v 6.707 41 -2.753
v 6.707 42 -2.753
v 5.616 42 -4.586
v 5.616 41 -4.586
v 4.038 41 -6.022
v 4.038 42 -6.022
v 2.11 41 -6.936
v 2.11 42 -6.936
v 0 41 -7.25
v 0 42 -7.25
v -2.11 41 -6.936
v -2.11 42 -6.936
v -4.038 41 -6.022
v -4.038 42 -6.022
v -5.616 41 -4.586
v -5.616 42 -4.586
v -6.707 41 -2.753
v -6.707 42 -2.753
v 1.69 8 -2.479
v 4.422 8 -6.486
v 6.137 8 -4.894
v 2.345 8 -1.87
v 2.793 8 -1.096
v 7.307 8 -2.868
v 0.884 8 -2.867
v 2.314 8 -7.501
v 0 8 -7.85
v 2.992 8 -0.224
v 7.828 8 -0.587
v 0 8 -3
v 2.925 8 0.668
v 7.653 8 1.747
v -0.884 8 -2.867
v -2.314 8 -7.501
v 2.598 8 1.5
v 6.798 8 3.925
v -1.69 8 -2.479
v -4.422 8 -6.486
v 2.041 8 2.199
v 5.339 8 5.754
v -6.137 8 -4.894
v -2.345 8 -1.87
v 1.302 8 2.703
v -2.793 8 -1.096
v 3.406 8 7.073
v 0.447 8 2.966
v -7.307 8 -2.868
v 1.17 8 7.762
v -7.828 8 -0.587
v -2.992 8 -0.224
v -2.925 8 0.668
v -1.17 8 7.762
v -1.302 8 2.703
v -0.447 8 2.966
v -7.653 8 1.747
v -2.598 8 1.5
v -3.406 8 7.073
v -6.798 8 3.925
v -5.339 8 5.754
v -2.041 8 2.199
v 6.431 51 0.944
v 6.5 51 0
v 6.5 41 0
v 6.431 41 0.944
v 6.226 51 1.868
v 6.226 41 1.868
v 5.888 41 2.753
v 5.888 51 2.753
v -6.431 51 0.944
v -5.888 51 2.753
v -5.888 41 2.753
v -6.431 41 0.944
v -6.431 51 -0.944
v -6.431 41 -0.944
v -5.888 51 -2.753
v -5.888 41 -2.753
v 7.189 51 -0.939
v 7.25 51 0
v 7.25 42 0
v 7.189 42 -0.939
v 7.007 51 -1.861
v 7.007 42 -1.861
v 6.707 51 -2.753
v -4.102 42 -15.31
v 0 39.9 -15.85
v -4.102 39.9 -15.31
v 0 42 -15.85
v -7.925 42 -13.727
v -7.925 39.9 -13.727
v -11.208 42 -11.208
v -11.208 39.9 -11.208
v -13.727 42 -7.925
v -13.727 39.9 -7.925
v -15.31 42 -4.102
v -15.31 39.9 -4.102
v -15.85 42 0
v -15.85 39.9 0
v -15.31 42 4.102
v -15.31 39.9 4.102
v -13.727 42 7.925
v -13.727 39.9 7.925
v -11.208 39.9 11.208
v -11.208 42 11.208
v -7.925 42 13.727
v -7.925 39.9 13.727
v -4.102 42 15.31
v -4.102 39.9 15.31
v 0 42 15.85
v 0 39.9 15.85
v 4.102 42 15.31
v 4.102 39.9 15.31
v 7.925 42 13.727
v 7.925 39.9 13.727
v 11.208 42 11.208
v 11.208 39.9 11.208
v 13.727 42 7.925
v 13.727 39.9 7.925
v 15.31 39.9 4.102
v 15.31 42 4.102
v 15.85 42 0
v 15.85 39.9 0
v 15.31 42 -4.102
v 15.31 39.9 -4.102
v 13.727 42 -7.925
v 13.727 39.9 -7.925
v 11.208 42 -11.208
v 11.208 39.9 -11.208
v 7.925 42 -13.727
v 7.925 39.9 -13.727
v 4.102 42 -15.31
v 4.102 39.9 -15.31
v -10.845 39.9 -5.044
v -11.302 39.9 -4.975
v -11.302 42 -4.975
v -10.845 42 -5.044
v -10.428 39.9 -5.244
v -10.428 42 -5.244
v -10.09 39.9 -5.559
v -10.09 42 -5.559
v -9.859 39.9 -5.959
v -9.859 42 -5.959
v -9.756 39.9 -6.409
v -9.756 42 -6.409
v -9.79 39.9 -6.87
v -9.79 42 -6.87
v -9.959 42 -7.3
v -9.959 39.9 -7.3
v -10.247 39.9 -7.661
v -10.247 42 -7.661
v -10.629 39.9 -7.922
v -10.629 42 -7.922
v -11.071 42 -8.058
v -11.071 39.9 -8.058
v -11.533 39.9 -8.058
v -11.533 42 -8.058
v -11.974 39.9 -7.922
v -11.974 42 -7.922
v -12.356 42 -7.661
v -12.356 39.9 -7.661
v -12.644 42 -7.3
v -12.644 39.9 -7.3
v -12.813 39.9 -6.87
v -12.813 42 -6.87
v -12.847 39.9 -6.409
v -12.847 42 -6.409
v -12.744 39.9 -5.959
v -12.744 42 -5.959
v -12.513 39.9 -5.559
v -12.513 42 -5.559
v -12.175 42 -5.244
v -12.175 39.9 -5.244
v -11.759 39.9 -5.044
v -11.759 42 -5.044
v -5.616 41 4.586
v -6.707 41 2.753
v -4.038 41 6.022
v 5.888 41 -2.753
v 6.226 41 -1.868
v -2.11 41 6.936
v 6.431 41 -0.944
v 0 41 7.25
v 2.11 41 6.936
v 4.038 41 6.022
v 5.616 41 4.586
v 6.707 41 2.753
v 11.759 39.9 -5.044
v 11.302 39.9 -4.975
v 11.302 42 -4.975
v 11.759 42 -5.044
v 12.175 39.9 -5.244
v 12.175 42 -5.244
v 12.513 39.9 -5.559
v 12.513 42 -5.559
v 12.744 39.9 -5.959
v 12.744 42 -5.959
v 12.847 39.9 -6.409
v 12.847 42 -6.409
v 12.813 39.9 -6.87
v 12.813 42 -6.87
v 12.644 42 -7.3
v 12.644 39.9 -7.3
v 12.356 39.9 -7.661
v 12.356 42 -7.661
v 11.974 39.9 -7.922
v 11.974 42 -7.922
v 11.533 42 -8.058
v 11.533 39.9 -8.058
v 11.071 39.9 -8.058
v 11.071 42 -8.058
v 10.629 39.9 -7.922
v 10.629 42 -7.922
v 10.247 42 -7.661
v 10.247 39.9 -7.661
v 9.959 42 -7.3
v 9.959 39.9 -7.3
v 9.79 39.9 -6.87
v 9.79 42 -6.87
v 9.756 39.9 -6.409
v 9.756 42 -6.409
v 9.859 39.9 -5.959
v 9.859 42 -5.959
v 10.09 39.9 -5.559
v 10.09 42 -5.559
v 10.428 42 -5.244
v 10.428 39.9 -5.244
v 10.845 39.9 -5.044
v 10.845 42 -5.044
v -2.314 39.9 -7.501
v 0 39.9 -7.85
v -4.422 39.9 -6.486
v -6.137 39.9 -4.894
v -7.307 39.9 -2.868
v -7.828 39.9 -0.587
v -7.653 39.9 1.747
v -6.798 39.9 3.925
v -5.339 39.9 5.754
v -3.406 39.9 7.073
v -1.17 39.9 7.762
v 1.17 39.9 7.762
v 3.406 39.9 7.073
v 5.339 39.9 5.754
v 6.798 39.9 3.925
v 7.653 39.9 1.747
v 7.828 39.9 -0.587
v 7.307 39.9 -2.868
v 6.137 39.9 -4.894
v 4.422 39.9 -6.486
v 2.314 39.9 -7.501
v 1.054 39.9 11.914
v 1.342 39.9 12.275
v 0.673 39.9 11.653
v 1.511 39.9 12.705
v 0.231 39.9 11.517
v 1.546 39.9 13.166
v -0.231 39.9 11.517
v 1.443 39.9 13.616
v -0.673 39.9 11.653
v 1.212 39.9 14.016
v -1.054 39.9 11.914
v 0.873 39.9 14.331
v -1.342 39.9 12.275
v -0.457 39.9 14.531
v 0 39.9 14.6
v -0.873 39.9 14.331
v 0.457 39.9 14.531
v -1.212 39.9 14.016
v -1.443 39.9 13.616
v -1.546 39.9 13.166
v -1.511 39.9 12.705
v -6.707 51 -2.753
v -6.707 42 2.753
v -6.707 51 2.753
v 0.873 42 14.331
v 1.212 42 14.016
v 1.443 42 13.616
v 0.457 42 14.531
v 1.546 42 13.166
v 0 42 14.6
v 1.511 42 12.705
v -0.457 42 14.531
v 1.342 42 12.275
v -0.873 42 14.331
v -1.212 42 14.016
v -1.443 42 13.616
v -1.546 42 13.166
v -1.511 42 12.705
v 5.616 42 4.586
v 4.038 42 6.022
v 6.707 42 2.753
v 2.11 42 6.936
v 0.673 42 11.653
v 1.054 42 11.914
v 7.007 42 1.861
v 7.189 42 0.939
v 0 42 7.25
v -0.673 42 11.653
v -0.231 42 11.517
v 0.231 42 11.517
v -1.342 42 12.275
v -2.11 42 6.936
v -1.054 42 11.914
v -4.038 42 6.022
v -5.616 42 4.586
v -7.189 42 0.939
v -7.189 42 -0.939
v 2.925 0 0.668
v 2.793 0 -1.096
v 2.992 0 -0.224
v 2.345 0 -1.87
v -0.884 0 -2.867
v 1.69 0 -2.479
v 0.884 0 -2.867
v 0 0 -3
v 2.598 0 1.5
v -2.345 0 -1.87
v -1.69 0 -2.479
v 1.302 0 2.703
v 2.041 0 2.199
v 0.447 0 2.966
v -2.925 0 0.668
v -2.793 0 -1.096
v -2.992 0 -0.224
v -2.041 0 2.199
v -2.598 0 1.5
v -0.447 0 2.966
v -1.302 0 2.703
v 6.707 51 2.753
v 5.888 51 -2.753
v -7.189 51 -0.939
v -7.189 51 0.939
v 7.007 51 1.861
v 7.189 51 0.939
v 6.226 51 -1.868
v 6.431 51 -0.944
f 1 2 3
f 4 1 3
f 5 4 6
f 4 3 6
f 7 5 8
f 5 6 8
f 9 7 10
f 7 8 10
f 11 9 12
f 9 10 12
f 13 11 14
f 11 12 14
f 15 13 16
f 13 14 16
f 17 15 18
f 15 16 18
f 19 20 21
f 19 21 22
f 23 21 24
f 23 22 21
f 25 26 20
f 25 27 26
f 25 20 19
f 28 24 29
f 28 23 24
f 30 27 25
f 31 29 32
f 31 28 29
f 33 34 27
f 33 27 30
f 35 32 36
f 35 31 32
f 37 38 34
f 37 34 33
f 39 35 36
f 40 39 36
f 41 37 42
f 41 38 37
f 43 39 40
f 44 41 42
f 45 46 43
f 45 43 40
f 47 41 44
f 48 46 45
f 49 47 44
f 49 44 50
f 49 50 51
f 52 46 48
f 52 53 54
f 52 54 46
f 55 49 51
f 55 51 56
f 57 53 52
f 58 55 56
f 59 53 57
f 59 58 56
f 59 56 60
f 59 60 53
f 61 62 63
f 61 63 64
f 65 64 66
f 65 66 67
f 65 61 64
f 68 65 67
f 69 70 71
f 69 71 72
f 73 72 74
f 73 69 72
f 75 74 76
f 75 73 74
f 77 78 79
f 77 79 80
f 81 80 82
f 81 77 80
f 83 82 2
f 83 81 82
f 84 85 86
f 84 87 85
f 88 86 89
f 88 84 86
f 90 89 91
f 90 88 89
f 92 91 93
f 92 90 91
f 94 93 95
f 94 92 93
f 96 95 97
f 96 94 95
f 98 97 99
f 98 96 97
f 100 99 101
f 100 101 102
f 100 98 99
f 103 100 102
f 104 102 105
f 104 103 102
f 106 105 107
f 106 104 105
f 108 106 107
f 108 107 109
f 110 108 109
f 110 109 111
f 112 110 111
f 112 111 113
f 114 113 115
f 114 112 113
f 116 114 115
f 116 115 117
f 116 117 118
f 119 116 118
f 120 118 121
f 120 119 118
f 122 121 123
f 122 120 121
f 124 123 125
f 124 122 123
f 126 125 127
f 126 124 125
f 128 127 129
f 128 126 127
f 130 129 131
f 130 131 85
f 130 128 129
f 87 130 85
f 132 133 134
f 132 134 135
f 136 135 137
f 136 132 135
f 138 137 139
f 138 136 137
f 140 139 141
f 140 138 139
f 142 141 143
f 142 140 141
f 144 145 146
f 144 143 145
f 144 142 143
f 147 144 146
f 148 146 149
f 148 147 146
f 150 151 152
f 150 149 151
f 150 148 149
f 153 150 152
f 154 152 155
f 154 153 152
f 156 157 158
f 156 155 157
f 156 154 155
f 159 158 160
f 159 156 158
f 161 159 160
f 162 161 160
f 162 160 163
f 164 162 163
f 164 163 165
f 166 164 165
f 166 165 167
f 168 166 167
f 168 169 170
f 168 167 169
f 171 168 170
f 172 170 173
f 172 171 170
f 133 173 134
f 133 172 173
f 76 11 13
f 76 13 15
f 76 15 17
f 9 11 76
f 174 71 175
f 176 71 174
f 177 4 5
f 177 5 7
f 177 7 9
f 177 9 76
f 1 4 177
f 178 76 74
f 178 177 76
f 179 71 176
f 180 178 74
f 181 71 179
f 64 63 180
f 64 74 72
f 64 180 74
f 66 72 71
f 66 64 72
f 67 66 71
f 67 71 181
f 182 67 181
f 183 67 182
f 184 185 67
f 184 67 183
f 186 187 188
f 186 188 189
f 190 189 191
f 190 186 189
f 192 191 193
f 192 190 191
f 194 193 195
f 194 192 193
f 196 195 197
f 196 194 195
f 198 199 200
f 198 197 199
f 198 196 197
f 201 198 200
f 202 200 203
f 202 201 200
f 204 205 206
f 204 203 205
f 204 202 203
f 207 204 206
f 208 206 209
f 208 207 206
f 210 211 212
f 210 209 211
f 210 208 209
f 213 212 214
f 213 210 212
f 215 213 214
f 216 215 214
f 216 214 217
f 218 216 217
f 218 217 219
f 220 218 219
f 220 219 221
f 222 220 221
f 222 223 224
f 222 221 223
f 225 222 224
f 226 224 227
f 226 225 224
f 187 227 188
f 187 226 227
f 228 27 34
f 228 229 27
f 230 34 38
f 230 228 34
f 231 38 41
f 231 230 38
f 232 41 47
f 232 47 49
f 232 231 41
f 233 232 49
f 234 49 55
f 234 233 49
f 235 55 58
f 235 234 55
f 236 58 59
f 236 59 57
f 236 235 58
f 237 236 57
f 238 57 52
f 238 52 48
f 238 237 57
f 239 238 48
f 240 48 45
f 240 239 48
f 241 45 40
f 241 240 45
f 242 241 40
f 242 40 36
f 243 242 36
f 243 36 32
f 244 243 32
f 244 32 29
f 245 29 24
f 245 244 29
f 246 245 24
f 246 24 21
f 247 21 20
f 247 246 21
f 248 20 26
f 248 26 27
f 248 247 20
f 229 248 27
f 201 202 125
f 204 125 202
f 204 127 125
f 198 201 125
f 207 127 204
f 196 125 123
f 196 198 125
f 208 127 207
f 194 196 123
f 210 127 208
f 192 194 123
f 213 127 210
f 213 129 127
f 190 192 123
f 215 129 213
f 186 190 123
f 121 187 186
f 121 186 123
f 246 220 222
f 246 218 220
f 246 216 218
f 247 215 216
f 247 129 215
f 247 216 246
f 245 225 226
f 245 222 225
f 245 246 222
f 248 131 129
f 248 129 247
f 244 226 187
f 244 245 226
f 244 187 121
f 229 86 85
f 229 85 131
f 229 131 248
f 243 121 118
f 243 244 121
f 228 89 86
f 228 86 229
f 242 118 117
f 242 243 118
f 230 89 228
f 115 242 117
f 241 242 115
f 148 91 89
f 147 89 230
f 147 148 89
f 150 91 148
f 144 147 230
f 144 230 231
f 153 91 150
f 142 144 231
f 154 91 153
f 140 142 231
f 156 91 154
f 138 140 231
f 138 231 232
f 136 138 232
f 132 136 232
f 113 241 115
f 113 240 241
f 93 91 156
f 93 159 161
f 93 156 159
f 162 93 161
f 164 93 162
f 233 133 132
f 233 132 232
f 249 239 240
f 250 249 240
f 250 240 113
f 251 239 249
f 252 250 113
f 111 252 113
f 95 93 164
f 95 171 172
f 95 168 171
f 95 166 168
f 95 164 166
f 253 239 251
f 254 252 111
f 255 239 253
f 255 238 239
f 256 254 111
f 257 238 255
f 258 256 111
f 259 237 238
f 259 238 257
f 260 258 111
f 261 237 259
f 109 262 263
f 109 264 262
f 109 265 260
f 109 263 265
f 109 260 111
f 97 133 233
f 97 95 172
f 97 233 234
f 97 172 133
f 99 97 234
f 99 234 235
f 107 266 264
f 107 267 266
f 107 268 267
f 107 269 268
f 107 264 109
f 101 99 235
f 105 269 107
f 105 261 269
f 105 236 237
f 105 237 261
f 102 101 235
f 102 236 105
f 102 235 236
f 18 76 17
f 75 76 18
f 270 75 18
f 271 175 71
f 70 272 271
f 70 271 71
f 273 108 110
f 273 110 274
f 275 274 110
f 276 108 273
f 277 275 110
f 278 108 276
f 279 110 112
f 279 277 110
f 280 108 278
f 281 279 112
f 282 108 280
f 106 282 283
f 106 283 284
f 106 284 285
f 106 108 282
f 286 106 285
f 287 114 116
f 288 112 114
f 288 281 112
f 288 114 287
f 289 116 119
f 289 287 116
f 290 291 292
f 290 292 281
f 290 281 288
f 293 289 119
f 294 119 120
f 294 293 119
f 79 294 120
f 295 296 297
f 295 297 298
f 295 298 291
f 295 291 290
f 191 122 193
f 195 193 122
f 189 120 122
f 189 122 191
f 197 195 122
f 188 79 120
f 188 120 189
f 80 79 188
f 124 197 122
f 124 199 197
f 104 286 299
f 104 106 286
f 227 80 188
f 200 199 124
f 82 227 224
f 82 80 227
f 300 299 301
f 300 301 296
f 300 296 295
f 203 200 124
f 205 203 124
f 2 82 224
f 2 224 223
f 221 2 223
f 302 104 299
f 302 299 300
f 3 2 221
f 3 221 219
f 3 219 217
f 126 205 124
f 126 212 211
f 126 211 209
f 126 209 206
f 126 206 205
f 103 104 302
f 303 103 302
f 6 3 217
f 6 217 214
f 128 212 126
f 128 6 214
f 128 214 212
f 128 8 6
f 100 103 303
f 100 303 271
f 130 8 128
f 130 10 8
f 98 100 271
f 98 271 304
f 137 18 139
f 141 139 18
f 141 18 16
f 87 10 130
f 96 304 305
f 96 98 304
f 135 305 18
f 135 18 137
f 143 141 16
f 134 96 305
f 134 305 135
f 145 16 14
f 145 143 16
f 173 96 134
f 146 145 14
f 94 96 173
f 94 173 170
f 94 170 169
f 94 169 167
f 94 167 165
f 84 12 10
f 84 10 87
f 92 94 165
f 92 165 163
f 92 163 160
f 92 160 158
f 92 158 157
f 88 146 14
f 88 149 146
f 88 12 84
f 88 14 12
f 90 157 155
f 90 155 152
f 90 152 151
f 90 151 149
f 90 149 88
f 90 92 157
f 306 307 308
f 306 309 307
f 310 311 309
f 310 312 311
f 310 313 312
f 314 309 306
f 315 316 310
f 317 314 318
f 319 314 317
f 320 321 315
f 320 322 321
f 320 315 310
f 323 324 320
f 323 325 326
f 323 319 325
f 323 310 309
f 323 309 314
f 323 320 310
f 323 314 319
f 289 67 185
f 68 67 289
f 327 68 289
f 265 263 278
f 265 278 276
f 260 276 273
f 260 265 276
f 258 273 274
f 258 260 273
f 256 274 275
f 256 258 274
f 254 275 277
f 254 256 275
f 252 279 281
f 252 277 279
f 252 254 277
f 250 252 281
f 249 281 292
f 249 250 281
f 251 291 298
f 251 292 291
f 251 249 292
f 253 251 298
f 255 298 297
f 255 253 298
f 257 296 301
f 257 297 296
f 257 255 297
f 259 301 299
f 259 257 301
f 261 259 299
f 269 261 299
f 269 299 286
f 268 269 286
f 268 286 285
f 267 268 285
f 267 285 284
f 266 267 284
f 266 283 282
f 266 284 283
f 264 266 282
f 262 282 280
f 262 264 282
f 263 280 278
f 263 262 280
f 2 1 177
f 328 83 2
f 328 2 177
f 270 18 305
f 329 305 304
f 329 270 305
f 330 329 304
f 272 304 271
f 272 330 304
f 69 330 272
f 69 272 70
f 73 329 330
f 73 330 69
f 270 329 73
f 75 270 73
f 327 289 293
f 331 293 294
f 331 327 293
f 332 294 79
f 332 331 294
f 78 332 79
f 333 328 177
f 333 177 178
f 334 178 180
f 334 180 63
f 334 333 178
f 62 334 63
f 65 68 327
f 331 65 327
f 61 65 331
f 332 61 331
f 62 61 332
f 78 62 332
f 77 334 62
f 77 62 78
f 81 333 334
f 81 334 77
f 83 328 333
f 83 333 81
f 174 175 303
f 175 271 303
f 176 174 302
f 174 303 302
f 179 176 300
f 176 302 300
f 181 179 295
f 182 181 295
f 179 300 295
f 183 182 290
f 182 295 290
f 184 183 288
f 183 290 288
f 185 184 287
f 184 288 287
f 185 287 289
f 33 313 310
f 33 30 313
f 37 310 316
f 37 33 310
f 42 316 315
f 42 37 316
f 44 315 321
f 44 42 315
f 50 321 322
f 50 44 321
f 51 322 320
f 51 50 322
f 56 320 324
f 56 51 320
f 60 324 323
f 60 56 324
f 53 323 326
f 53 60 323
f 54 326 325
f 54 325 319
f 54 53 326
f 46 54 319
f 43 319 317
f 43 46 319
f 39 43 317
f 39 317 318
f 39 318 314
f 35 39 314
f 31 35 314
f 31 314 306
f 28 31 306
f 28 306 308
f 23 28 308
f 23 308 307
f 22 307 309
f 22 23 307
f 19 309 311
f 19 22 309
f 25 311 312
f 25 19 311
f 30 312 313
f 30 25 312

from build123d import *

# Parameters (mm, degrees)
SKETCH_1_W               = 3
SKETCH_1_H               = 8
SKETCH_2_R               = 7.25
CUT_EXTRUDE_1_DEPTH      = 1
EXTRUDE_START            = 10
EXTRUDE_1_DEPTH          = 10
CUT_EXTRUDE_2_DEPTH      = 48.607194834
CUT_EXTRUDE_2_DEPTH_BACK = 48.607194834
SKETCH_4_R               = 1.55


with BuildPart() as part:
    # 草图1 → 旋转1 (revolve)
    with BuildSketch(Plane.XY, mode=Mode.PRIVATE) as revolve_1_sk:
        Polygon((0, 42), (0, 39.9), (7.85, 39.9), (15.85, 39.9), (15.85, 42), align=None)
        Polygon((0, 39.9), (0, 8), (3, 8), (7.85, 8), (7.85, 39.9), align=None)
        with Locations((1.5, 4)):
            Rectangle(SKETCH_1_W, SKETCH_1_H)
    revolve(revolve_1_sk.sketch.rotate(Axis((0, 0, 0), (0, 1, 0)), 90), axis=Axis((0, 0, 0), (0, 1, 0)))

    # 草图2 → 切除-拉伸1 (cut)
    with BuildSketch(Plane(origin=(0, 42, 0), x_dir=(1, 0, 0), z_dir=(0, 1, 0))):
        with Locations(Location((0, 0, 0), (0, 0, 270))):
            Circle(SKETCH_2_R)
    extrude(amount=-CUT_EXTRUDE_1_DEPTH, mode=Mode.SUBTRACT)

    # 草图3 → 凸台-拉伸1 (add)
    with BuildSketch(Plane(origin=(0, 41, 0), x_dir=(1, 0, 0), z_dir=(0, 1, 0)).offset(EXTRUDE_START)):
        with BuildLine():
            Line((-5.888377744, 2.752636472), (-6.707122517, 2.752636472))
            ThreePointArc((-6.707122517, 2.752636472), (-7.25, 0), (-6.707122517, -2.752636472))
            Line((-6.707122517, -2.752636472), (-5.888377744, -2.752636472))
            ThreePointArc((-5.888377744, -2.752636472), (-6.5, 0), (-5.888377744, 2.752636472))
        make_face()
        with BuildLine():
            ThreePointArc((7.25, 0), (7.11298595, 1.402829597), (6.707122517, 2.752636472))
            Line((6.707122517, 2.752636472), (5.888377744, 2.752636472))
            ThreePointArc((5.888377744, 2.752636472), (6.345252372, 1.409883801), (6.5, 0))
            ThreePointArc((6.5, 0), (6.345252372, -1.409883801), (5.888377744, -2.752636472))
            Line((5.888377744, -2.752636472), (6.707122517, -2.752636472))
            ThreePointArc((6.707122517, -2.752636472), (7.11298595, -1.402829597), (7.25, 0))
        make_face()
    extrude(amount=-EXTRUDE_1_DEPTH)

    # 草图4 → 切除-拉伸2 (cut, two sides: drawn at the far end of the back side and taken through both)
    with BuildSketch(Plane(origin=(0, 42, 0), x_dir=(1, 0, 0), z_dir=(0, 1, 0)).offset(-CUT_EXTRUDE_2_DEPTH_BACK)):
        with Locations(Location((0, -13.05, 0), (0, 0, 270))):
            Circle(SKETCH_4_R)
        with Locations(Location((-11.301631519, 6.525, 0), (0, 0, 270))):
            Circle(SKETCH_4_R)
        with Locations(Location((11.301631519, 6.525, 0), (0, 0, 270))):
            Circle(SKETCH_4_R)
    extrude(amount=CUT_EXTRUDE_2_DEPTH + CUT_EXTRUDE_2_DEPTH_BACK, mode=Mode.SUBTRACT)


solid = part.part
